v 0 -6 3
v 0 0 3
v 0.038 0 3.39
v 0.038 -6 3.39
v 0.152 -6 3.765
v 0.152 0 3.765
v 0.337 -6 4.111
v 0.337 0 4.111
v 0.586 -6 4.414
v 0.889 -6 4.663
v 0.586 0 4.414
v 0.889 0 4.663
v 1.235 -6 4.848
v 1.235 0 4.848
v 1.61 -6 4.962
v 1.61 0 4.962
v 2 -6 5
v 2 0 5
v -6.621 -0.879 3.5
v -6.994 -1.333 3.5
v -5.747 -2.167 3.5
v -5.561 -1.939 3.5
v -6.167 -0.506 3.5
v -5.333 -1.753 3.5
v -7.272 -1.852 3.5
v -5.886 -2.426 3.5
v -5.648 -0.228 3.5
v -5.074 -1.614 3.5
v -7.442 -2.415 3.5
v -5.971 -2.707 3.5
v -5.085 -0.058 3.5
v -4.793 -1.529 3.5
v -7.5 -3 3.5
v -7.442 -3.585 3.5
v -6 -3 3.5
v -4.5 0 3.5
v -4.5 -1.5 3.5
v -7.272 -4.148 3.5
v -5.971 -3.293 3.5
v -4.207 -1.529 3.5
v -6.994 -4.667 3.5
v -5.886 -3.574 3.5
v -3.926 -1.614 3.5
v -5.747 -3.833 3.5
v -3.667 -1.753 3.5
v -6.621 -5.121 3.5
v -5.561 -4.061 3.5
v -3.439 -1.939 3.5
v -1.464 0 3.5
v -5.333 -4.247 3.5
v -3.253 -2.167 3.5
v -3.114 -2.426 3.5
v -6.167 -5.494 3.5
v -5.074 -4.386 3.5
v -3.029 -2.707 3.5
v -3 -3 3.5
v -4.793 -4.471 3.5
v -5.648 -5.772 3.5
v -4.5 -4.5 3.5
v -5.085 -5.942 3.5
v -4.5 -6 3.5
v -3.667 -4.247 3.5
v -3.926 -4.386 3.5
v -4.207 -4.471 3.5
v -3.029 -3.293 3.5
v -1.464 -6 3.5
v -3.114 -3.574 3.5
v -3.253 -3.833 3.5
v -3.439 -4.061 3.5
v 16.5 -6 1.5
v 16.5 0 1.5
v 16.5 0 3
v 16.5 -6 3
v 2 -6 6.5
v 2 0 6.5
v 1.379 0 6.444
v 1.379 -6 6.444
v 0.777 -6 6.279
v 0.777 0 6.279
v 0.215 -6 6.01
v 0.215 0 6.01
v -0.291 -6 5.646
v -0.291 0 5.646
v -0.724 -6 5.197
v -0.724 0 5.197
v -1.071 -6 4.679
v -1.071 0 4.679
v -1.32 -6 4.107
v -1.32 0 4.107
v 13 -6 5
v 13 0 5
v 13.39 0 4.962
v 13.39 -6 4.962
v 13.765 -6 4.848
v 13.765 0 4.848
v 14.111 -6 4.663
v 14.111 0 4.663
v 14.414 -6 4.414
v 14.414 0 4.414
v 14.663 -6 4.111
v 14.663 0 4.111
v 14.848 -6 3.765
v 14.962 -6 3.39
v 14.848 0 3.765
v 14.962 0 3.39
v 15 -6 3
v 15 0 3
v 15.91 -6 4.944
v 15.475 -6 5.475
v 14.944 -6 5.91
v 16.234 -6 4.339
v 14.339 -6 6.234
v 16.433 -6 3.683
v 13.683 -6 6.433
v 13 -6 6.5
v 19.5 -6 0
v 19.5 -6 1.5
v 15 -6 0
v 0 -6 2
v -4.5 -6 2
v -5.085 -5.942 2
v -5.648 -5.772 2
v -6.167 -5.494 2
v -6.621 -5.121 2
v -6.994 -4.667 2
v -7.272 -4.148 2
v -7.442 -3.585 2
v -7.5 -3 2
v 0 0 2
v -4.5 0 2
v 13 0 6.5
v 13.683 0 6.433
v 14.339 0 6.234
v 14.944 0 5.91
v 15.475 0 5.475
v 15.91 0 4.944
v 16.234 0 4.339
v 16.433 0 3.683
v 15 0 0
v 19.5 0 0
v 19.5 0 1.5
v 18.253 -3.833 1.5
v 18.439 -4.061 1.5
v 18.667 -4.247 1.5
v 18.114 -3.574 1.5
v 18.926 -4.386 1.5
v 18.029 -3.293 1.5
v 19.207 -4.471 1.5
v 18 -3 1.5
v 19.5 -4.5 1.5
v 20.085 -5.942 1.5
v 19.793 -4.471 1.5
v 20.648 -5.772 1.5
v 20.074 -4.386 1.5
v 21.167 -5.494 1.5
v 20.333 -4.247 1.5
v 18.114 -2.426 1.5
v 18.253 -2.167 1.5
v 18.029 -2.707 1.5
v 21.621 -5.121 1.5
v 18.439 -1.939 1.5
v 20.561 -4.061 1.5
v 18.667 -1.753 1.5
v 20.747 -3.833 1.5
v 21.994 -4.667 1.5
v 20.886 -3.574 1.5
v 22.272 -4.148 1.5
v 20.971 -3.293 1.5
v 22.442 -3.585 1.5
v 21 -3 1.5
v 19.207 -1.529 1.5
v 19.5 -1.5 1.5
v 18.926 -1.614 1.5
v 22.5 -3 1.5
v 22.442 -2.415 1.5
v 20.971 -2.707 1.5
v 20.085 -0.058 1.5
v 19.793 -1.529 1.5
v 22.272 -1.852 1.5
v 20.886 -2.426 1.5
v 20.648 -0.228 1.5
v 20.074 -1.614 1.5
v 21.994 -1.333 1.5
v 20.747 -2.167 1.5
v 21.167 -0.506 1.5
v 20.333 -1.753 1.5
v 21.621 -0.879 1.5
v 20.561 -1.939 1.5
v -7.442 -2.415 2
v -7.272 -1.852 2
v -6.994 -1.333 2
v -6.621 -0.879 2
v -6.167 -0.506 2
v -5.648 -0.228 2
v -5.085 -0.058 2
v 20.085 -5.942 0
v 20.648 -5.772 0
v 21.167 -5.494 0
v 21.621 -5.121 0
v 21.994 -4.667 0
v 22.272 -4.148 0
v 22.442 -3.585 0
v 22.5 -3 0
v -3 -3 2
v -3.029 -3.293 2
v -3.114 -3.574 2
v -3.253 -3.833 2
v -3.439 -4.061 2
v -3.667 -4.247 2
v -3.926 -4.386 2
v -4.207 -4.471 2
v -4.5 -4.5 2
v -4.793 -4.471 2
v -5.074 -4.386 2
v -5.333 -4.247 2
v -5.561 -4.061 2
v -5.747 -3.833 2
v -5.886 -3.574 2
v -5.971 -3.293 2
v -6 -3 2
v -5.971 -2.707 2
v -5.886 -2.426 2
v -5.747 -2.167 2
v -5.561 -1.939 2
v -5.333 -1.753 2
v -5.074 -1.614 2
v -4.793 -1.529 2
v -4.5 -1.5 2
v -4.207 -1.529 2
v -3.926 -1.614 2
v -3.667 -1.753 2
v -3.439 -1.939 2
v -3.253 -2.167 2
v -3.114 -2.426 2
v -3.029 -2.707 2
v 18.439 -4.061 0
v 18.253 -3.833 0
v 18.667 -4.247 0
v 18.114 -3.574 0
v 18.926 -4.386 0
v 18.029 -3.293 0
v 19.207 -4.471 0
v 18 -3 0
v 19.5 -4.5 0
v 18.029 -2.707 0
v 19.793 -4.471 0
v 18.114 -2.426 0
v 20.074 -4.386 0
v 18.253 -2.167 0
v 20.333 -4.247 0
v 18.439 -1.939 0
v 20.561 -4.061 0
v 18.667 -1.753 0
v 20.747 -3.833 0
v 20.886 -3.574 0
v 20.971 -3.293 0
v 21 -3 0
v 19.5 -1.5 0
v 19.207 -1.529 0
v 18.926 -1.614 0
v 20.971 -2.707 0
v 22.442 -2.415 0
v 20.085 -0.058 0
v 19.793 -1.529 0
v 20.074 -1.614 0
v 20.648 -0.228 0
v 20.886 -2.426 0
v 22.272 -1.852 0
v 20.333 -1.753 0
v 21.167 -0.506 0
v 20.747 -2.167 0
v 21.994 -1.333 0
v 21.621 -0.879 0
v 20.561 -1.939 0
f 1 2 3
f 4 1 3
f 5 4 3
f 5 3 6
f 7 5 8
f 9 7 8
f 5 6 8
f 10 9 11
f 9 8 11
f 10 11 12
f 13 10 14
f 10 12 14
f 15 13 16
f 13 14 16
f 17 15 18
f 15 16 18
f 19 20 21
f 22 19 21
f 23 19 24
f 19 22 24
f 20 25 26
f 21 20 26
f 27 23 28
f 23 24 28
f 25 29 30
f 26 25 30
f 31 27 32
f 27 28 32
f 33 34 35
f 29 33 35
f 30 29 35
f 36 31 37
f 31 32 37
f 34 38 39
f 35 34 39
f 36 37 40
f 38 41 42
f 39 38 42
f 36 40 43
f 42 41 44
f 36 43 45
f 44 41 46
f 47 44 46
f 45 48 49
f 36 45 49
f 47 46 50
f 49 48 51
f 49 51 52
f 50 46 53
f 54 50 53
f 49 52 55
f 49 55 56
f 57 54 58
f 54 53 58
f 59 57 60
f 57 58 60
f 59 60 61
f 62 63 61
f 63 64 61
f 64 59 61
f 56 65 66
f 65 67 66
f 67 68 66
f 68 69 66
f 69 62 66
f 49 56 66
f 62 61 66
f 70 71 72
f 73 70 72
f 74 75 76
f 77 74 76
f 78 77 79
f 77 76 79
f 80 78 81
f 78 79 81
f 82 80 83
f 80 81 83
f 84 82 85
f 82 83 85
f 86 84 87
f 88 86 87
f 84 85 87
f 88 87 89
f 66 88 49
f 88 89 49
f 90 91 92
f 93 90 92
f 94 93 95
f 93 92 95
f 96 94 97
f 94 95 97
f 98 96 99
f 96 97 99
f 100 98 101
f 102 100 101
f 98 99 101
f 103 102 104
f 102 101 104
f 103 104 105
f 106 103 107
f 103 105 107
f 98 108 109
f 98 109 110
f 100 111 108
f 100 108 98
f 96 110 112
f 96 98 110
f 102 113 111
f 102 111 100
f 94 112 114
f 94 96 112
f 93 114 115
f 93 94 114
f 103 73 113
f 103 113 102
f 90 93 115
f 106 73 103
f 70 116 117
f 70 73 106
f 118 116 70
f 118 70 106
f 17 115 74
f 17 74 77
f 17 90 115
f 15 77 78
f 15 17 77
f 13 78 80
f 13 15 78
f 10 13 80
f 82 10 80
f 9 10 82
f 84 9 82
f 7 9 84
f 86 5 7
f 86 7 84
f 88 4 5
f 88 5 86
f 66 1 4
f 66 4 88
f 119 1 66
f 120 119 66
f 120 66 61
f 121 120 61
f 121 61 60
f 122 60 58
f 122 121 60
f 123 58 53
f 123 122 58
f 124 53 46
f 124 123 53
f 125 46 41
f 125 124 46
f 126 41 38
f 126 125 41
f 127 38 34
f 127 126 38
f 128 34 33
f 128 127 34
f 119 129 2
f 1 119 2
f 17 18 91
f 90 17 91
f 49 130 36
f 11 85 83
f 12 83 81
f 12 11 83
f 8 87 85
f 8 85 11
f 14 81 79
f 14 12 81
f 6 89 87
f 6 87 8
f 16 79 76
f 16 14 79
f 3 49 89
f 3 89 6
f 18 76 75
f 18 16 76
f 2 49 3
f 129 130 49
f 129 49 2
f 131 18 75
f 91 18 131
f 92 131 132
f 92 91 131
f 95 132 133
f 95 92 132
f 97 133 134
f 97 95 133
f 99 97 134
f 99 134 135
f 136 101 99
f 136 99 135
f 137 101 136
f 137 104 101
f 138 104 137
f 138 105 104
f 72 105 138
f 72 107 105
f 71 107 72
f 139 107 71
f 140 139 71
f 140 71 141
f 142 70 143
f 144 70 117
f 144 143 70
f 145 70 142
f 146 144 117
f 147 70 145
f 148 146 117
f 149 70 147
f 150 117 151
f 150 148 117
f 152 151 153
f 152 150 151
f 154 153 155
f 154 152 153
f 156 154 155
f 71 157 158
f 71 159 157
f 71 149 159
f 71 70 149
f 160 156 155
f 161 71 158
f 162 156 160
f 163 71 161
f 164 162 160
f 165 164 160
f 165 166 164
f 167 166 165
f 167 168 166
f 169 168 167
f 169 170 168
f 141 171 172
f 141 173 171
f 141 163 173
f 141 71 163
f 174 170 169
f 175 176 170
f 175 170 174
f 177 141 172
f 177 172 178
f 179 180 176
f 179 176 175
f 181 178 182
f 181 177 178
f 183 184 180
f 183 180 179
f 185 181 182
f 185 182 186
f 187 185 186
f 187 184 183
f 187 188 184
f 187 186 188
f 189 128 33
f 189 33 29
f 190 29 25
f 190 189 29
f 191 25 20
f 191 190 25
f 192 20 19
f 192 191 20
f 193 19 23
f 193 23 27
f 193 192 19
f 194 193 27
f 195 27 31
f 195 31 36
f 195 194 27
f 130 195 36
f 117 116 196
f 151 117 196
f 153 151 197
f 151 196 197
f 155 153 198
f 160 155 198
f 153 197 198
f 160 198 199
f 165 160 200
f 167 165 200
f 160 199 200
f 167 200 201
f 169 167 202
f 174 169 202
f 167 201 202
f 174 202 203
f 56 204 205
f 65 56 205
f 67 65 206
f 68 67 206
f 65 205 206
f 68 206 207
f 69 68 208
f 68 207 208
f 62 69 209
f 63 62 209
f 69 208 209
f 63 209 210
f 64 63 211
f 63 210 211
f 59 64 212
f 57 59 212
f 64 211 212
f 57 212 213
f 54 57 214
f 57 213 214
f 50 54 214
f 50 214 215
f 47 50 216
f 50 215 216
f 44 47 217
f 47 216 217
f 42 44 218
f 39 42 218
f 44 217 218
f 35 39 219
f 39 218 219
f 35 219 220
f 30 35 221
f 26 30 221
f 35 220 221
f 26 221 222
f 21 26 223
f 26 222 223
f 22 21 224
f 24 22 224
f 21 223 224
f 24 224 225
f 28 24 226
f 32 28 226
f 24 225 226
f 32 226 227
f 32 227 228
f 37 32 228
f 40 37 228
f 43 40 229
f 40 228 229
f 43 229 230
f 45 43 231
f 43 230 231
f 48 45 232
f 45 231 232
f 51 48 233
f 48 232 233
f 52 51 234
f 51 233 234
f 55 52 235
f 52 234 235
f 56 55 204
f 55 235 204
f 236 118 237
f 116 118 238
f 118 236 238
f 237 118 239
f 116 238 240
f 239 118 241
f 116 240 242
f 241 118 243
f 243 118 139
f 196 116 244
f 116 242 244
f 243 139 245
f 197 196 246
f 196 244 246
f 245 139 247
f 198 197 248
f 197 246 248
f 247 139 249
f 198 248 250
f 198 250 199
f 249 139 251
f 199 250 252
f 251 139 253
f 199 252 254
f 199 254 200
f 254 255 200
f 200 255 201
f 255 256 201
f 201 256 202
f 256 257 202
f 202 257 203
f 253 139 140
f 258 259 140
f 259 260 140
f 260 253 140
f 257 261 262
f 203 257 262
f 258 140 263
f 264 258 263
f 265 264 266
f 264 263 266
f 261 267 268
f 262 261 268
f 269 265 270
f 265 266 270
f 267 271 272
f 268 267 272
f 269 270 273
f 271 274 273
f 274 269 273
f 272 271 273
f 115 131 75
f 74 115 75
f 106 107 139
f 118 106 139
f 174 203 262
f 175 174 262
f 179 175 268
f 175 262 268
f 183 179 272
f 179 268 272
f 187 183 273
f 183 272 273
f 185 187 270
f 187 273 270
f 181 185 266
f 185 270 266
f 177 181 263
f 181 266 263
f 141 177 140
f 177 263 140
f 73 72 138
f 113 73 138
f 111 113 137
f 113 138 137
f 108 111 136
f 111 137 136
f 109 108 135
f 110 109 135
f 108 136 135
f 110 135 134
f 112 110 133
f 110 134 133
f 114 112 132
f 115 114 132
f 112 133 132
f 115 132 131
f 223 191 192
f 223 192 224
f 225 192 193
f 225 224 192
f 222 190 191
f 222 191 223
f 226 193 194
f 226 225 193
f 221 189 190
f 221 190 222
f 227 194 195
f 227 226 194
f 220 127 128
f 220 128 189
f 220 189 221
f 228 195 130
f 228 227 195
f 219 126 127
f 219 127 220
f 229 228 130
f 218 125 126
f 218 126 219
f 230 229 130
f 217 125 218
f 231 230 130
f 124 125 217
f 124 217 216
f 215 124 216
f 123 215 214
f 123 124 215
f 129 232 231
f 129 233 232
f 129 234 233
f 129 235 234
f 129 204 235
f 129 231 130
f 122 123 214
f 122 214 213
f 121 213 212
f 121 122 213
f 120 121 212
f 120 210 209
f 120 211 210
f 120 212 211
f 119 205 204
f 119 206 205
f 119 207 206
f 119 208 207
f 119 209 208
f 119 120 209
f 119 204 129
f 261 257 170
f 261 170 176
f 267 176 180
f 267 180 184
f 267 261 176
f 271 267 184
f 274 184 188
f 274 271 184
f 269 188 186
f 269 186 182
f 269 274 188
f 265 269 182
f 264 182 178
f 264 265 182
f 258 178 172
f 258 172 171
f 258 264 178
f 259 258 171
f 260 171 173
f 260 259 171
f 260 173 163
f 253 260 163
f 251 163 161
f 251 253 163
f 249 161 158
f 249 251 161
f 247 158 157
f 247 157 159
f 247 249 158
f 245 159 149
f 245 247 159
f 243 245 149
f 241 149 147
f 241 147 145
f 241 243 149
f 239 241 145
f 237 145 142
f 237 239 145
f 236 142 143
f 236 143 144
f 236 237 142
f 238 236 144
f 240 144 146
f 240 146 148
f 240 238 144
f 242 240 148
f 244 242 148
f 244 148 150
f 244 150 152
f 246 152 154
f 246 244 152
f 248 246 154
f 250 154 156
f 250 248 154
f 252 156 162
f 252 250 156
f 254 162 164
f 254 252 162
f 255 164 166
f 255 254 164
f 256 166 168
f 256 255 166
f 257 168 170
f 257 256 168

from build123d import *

# Parameters (mm, degrees)
F1_DEPTH = 6
F2_R     = 1.5
F3_DEPTH = 1.5
F4_R     = 1.5
F4_W     = 1.5
F4_H     = 6
F5_DEPTH = 1.5


with BuildPart() as f1:
    # F0 (on Front) → F1 (new body)
    with BuildSketch(Plane.XZ):
        with BuildLine():
            Line((15, 3), (15, 0))
            Line((15, 0), (16.5, 0))
            Line((16.5, 0), (16.5, 3))
            ThreePointArc((16.5, 3), (15.474874, 5.474874), (13, 6.5))
            Line((13, 6.5), (2, 6.5))
            ThreePointArc((2, 6.5), (-0.474874, 5.474874), (-1.5, 3))
            Line((-1.5, 3), (-1.5, 2))
            Line((-1.5, 2), (0, 2))
            Line((0, 2), (0, 3))
            ThreePointArc((0, 3), (0.585786, 4.414214), (2, 5))
            Line((2, 5), (13, 5))
            ThreePointArc((13, 5), (14.414214, 4.414214), (15, 3))
        make_face()
    extrude(amount=F1_DEPTH)

    # F2 (on Top) → F3 (join)
    with BuildSketch(Plane.XY):
        with BuildLine():
            Line((16.5, 0), (16.5, -6))
            Line((16.5, -6), (19.5, -6))
            ThreePointArc((19.5, -6), (21.62132, -5.12132), (22.5, -3))
            ThreePointArc((22.5, -3), (21.62132, -0.87868), (19.5, 0))
            Line((19.5, 0), (16.5, 0))
        make_face()
        with Locations((19.5, -3)):
            Circle(F2_R, mode=Mode.SUBTRACT)
    extrude(amount=F3_DEPTH)

    # F4 (on face) → F5 (join)
    with BuildSketch(Plane(origin=(0, 0, 2), x_dir=(1, 0, 0), z_dir=(0, 0, -1))):
        with BuildLine():
            Line((-1.5, 6), (-4.5, 6))
            ThreePointArc((-4.5, 6), (-6.62132, 5.12132), (-7.5, 3))
            ThreePointArc((-7.5, 3), (-6.62132, 0.87868), (-4.5, 0))
            Line((-4.5, 0), (-1.5, 0))
            Line((-1.5, 0), (-1.5, 6))
        make_face()
        with Locations((-4.5, 3)):
            Circle(F4_R, mode=Mode.SUBTRACT)
        with Locations((-0.75, 3)):
            Rectangle(F4_W, F4_H)
    extrude(amount=-F5_DEPTH)


solid = f1.part
